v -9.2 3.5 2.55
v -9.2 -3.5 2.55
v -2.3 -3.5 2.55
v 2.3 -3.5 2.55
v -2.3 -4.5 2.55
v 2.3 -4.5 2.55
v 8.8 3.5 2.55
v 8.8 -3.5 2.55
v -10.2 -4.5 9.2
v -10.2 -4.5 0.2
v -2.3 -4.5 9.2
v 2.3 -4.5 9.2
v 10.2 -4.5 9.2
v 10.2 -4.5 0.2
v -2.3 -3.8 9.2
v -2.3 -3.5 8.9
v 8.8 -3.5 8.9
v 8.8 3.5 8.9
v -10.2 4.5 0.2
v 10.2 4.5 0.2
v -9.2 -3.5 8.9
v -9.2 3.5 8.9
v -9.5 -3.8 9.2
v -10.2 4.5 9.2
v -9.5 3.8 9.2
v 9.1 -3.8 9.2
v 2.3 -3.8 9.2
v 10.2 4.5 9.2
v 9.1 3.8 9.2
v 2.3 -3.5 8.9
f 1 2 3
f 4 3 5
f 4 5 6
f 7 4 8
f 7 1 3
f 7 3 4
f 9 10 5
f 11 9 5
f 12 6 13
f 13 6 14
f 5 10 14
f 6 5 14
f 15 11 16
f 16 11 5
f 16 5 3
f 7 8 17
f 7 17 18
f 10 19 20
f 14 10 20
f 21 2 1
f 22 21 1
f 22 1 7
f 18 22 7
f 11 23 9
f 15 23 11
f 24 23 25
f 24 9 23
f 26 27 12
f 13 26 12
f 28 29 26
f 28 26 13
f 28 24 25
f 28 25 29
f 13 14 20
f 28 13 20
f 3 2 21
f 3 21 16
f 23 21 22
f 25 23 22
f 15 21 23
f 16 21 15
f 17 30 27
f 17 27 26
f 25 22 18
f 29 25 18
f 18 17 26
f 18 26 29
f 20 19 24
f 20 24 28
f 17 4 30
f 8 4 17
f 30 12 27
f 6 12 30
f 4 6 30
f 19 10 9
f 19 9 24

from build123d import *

# Parameters (mm, degrees)
BOX004_W        = 4.6
BOX004_H        = 2
BOX004_DEPTH    = 6.65
BOX003_W        = 18
BOX003_H        = 7
BOX003_DEPTH    = 6.65
BOX002_W        = 20.4
BOX002_H        = 9
BOX002_DEPTH    = 9
CHAMFER001_SIZE = 0.3


with BuildPart() as cube004:
    # Box004 → Box004 (new body)
    with BuildSketch(Plane(origin=(-2.3, -5, 2.55), x_dir=(1, 0, 0), z_dir=(0, 0, 1))):
        with Locations((2.3, 1)):
            Rectangle(BOX004_W, BOX004_H)
    extrude(amount=BOX004_DEPTH)


with BuildPart() as cube003:
    # Box003 → Box003 (new body)
    with BuildSketch(Plane(origin=(-9.2, -3.5, 2.55), x_dir=(1, 0, 0), z_dir=(0, 0, 1))):
        with Locations((9, 3.5)):
            Rectangle(BOX003_W, BOX003_H)
    extrude(amount=BOX003_DEPTH)


with BuildPart() as chamfer001:
    # Box002 → Box002 (new body)
    with BuildSketch(Plane(origin=(-10.2, -4.5, 0.2), x_dir=(1, 0, 0), z_dir=(0, 0, 1))):
        with Locations((10.2, 4.5)):
            Rectangle(BOX002_W, BOX002_H)
    extrude(amount=BOX002_DEPTH)

    # Cut: cut Cube003
    add(cube003.part, mode=Mode.SUBTRACT)

    # Cut001: cut Cube004
    add(cube004.part, mode=Mode.SUBTRACT)

    # Chamfer001
    chamfer001_edges = [chamfer001.edges().sort_by_distance(p)[0] for p in [
        (5.55, -3.5, 9.2),
        (8.8, 0, 9.2),
        (-0.2, 3.5, 9.2),
        (-9.2, 0, 9.2),
        (-5.75, -3.5, 9.2),
    ]]
    chamfer(chamfer001_edges, length=CHAMFER001_SIZE)


solid = chamfer001.part
